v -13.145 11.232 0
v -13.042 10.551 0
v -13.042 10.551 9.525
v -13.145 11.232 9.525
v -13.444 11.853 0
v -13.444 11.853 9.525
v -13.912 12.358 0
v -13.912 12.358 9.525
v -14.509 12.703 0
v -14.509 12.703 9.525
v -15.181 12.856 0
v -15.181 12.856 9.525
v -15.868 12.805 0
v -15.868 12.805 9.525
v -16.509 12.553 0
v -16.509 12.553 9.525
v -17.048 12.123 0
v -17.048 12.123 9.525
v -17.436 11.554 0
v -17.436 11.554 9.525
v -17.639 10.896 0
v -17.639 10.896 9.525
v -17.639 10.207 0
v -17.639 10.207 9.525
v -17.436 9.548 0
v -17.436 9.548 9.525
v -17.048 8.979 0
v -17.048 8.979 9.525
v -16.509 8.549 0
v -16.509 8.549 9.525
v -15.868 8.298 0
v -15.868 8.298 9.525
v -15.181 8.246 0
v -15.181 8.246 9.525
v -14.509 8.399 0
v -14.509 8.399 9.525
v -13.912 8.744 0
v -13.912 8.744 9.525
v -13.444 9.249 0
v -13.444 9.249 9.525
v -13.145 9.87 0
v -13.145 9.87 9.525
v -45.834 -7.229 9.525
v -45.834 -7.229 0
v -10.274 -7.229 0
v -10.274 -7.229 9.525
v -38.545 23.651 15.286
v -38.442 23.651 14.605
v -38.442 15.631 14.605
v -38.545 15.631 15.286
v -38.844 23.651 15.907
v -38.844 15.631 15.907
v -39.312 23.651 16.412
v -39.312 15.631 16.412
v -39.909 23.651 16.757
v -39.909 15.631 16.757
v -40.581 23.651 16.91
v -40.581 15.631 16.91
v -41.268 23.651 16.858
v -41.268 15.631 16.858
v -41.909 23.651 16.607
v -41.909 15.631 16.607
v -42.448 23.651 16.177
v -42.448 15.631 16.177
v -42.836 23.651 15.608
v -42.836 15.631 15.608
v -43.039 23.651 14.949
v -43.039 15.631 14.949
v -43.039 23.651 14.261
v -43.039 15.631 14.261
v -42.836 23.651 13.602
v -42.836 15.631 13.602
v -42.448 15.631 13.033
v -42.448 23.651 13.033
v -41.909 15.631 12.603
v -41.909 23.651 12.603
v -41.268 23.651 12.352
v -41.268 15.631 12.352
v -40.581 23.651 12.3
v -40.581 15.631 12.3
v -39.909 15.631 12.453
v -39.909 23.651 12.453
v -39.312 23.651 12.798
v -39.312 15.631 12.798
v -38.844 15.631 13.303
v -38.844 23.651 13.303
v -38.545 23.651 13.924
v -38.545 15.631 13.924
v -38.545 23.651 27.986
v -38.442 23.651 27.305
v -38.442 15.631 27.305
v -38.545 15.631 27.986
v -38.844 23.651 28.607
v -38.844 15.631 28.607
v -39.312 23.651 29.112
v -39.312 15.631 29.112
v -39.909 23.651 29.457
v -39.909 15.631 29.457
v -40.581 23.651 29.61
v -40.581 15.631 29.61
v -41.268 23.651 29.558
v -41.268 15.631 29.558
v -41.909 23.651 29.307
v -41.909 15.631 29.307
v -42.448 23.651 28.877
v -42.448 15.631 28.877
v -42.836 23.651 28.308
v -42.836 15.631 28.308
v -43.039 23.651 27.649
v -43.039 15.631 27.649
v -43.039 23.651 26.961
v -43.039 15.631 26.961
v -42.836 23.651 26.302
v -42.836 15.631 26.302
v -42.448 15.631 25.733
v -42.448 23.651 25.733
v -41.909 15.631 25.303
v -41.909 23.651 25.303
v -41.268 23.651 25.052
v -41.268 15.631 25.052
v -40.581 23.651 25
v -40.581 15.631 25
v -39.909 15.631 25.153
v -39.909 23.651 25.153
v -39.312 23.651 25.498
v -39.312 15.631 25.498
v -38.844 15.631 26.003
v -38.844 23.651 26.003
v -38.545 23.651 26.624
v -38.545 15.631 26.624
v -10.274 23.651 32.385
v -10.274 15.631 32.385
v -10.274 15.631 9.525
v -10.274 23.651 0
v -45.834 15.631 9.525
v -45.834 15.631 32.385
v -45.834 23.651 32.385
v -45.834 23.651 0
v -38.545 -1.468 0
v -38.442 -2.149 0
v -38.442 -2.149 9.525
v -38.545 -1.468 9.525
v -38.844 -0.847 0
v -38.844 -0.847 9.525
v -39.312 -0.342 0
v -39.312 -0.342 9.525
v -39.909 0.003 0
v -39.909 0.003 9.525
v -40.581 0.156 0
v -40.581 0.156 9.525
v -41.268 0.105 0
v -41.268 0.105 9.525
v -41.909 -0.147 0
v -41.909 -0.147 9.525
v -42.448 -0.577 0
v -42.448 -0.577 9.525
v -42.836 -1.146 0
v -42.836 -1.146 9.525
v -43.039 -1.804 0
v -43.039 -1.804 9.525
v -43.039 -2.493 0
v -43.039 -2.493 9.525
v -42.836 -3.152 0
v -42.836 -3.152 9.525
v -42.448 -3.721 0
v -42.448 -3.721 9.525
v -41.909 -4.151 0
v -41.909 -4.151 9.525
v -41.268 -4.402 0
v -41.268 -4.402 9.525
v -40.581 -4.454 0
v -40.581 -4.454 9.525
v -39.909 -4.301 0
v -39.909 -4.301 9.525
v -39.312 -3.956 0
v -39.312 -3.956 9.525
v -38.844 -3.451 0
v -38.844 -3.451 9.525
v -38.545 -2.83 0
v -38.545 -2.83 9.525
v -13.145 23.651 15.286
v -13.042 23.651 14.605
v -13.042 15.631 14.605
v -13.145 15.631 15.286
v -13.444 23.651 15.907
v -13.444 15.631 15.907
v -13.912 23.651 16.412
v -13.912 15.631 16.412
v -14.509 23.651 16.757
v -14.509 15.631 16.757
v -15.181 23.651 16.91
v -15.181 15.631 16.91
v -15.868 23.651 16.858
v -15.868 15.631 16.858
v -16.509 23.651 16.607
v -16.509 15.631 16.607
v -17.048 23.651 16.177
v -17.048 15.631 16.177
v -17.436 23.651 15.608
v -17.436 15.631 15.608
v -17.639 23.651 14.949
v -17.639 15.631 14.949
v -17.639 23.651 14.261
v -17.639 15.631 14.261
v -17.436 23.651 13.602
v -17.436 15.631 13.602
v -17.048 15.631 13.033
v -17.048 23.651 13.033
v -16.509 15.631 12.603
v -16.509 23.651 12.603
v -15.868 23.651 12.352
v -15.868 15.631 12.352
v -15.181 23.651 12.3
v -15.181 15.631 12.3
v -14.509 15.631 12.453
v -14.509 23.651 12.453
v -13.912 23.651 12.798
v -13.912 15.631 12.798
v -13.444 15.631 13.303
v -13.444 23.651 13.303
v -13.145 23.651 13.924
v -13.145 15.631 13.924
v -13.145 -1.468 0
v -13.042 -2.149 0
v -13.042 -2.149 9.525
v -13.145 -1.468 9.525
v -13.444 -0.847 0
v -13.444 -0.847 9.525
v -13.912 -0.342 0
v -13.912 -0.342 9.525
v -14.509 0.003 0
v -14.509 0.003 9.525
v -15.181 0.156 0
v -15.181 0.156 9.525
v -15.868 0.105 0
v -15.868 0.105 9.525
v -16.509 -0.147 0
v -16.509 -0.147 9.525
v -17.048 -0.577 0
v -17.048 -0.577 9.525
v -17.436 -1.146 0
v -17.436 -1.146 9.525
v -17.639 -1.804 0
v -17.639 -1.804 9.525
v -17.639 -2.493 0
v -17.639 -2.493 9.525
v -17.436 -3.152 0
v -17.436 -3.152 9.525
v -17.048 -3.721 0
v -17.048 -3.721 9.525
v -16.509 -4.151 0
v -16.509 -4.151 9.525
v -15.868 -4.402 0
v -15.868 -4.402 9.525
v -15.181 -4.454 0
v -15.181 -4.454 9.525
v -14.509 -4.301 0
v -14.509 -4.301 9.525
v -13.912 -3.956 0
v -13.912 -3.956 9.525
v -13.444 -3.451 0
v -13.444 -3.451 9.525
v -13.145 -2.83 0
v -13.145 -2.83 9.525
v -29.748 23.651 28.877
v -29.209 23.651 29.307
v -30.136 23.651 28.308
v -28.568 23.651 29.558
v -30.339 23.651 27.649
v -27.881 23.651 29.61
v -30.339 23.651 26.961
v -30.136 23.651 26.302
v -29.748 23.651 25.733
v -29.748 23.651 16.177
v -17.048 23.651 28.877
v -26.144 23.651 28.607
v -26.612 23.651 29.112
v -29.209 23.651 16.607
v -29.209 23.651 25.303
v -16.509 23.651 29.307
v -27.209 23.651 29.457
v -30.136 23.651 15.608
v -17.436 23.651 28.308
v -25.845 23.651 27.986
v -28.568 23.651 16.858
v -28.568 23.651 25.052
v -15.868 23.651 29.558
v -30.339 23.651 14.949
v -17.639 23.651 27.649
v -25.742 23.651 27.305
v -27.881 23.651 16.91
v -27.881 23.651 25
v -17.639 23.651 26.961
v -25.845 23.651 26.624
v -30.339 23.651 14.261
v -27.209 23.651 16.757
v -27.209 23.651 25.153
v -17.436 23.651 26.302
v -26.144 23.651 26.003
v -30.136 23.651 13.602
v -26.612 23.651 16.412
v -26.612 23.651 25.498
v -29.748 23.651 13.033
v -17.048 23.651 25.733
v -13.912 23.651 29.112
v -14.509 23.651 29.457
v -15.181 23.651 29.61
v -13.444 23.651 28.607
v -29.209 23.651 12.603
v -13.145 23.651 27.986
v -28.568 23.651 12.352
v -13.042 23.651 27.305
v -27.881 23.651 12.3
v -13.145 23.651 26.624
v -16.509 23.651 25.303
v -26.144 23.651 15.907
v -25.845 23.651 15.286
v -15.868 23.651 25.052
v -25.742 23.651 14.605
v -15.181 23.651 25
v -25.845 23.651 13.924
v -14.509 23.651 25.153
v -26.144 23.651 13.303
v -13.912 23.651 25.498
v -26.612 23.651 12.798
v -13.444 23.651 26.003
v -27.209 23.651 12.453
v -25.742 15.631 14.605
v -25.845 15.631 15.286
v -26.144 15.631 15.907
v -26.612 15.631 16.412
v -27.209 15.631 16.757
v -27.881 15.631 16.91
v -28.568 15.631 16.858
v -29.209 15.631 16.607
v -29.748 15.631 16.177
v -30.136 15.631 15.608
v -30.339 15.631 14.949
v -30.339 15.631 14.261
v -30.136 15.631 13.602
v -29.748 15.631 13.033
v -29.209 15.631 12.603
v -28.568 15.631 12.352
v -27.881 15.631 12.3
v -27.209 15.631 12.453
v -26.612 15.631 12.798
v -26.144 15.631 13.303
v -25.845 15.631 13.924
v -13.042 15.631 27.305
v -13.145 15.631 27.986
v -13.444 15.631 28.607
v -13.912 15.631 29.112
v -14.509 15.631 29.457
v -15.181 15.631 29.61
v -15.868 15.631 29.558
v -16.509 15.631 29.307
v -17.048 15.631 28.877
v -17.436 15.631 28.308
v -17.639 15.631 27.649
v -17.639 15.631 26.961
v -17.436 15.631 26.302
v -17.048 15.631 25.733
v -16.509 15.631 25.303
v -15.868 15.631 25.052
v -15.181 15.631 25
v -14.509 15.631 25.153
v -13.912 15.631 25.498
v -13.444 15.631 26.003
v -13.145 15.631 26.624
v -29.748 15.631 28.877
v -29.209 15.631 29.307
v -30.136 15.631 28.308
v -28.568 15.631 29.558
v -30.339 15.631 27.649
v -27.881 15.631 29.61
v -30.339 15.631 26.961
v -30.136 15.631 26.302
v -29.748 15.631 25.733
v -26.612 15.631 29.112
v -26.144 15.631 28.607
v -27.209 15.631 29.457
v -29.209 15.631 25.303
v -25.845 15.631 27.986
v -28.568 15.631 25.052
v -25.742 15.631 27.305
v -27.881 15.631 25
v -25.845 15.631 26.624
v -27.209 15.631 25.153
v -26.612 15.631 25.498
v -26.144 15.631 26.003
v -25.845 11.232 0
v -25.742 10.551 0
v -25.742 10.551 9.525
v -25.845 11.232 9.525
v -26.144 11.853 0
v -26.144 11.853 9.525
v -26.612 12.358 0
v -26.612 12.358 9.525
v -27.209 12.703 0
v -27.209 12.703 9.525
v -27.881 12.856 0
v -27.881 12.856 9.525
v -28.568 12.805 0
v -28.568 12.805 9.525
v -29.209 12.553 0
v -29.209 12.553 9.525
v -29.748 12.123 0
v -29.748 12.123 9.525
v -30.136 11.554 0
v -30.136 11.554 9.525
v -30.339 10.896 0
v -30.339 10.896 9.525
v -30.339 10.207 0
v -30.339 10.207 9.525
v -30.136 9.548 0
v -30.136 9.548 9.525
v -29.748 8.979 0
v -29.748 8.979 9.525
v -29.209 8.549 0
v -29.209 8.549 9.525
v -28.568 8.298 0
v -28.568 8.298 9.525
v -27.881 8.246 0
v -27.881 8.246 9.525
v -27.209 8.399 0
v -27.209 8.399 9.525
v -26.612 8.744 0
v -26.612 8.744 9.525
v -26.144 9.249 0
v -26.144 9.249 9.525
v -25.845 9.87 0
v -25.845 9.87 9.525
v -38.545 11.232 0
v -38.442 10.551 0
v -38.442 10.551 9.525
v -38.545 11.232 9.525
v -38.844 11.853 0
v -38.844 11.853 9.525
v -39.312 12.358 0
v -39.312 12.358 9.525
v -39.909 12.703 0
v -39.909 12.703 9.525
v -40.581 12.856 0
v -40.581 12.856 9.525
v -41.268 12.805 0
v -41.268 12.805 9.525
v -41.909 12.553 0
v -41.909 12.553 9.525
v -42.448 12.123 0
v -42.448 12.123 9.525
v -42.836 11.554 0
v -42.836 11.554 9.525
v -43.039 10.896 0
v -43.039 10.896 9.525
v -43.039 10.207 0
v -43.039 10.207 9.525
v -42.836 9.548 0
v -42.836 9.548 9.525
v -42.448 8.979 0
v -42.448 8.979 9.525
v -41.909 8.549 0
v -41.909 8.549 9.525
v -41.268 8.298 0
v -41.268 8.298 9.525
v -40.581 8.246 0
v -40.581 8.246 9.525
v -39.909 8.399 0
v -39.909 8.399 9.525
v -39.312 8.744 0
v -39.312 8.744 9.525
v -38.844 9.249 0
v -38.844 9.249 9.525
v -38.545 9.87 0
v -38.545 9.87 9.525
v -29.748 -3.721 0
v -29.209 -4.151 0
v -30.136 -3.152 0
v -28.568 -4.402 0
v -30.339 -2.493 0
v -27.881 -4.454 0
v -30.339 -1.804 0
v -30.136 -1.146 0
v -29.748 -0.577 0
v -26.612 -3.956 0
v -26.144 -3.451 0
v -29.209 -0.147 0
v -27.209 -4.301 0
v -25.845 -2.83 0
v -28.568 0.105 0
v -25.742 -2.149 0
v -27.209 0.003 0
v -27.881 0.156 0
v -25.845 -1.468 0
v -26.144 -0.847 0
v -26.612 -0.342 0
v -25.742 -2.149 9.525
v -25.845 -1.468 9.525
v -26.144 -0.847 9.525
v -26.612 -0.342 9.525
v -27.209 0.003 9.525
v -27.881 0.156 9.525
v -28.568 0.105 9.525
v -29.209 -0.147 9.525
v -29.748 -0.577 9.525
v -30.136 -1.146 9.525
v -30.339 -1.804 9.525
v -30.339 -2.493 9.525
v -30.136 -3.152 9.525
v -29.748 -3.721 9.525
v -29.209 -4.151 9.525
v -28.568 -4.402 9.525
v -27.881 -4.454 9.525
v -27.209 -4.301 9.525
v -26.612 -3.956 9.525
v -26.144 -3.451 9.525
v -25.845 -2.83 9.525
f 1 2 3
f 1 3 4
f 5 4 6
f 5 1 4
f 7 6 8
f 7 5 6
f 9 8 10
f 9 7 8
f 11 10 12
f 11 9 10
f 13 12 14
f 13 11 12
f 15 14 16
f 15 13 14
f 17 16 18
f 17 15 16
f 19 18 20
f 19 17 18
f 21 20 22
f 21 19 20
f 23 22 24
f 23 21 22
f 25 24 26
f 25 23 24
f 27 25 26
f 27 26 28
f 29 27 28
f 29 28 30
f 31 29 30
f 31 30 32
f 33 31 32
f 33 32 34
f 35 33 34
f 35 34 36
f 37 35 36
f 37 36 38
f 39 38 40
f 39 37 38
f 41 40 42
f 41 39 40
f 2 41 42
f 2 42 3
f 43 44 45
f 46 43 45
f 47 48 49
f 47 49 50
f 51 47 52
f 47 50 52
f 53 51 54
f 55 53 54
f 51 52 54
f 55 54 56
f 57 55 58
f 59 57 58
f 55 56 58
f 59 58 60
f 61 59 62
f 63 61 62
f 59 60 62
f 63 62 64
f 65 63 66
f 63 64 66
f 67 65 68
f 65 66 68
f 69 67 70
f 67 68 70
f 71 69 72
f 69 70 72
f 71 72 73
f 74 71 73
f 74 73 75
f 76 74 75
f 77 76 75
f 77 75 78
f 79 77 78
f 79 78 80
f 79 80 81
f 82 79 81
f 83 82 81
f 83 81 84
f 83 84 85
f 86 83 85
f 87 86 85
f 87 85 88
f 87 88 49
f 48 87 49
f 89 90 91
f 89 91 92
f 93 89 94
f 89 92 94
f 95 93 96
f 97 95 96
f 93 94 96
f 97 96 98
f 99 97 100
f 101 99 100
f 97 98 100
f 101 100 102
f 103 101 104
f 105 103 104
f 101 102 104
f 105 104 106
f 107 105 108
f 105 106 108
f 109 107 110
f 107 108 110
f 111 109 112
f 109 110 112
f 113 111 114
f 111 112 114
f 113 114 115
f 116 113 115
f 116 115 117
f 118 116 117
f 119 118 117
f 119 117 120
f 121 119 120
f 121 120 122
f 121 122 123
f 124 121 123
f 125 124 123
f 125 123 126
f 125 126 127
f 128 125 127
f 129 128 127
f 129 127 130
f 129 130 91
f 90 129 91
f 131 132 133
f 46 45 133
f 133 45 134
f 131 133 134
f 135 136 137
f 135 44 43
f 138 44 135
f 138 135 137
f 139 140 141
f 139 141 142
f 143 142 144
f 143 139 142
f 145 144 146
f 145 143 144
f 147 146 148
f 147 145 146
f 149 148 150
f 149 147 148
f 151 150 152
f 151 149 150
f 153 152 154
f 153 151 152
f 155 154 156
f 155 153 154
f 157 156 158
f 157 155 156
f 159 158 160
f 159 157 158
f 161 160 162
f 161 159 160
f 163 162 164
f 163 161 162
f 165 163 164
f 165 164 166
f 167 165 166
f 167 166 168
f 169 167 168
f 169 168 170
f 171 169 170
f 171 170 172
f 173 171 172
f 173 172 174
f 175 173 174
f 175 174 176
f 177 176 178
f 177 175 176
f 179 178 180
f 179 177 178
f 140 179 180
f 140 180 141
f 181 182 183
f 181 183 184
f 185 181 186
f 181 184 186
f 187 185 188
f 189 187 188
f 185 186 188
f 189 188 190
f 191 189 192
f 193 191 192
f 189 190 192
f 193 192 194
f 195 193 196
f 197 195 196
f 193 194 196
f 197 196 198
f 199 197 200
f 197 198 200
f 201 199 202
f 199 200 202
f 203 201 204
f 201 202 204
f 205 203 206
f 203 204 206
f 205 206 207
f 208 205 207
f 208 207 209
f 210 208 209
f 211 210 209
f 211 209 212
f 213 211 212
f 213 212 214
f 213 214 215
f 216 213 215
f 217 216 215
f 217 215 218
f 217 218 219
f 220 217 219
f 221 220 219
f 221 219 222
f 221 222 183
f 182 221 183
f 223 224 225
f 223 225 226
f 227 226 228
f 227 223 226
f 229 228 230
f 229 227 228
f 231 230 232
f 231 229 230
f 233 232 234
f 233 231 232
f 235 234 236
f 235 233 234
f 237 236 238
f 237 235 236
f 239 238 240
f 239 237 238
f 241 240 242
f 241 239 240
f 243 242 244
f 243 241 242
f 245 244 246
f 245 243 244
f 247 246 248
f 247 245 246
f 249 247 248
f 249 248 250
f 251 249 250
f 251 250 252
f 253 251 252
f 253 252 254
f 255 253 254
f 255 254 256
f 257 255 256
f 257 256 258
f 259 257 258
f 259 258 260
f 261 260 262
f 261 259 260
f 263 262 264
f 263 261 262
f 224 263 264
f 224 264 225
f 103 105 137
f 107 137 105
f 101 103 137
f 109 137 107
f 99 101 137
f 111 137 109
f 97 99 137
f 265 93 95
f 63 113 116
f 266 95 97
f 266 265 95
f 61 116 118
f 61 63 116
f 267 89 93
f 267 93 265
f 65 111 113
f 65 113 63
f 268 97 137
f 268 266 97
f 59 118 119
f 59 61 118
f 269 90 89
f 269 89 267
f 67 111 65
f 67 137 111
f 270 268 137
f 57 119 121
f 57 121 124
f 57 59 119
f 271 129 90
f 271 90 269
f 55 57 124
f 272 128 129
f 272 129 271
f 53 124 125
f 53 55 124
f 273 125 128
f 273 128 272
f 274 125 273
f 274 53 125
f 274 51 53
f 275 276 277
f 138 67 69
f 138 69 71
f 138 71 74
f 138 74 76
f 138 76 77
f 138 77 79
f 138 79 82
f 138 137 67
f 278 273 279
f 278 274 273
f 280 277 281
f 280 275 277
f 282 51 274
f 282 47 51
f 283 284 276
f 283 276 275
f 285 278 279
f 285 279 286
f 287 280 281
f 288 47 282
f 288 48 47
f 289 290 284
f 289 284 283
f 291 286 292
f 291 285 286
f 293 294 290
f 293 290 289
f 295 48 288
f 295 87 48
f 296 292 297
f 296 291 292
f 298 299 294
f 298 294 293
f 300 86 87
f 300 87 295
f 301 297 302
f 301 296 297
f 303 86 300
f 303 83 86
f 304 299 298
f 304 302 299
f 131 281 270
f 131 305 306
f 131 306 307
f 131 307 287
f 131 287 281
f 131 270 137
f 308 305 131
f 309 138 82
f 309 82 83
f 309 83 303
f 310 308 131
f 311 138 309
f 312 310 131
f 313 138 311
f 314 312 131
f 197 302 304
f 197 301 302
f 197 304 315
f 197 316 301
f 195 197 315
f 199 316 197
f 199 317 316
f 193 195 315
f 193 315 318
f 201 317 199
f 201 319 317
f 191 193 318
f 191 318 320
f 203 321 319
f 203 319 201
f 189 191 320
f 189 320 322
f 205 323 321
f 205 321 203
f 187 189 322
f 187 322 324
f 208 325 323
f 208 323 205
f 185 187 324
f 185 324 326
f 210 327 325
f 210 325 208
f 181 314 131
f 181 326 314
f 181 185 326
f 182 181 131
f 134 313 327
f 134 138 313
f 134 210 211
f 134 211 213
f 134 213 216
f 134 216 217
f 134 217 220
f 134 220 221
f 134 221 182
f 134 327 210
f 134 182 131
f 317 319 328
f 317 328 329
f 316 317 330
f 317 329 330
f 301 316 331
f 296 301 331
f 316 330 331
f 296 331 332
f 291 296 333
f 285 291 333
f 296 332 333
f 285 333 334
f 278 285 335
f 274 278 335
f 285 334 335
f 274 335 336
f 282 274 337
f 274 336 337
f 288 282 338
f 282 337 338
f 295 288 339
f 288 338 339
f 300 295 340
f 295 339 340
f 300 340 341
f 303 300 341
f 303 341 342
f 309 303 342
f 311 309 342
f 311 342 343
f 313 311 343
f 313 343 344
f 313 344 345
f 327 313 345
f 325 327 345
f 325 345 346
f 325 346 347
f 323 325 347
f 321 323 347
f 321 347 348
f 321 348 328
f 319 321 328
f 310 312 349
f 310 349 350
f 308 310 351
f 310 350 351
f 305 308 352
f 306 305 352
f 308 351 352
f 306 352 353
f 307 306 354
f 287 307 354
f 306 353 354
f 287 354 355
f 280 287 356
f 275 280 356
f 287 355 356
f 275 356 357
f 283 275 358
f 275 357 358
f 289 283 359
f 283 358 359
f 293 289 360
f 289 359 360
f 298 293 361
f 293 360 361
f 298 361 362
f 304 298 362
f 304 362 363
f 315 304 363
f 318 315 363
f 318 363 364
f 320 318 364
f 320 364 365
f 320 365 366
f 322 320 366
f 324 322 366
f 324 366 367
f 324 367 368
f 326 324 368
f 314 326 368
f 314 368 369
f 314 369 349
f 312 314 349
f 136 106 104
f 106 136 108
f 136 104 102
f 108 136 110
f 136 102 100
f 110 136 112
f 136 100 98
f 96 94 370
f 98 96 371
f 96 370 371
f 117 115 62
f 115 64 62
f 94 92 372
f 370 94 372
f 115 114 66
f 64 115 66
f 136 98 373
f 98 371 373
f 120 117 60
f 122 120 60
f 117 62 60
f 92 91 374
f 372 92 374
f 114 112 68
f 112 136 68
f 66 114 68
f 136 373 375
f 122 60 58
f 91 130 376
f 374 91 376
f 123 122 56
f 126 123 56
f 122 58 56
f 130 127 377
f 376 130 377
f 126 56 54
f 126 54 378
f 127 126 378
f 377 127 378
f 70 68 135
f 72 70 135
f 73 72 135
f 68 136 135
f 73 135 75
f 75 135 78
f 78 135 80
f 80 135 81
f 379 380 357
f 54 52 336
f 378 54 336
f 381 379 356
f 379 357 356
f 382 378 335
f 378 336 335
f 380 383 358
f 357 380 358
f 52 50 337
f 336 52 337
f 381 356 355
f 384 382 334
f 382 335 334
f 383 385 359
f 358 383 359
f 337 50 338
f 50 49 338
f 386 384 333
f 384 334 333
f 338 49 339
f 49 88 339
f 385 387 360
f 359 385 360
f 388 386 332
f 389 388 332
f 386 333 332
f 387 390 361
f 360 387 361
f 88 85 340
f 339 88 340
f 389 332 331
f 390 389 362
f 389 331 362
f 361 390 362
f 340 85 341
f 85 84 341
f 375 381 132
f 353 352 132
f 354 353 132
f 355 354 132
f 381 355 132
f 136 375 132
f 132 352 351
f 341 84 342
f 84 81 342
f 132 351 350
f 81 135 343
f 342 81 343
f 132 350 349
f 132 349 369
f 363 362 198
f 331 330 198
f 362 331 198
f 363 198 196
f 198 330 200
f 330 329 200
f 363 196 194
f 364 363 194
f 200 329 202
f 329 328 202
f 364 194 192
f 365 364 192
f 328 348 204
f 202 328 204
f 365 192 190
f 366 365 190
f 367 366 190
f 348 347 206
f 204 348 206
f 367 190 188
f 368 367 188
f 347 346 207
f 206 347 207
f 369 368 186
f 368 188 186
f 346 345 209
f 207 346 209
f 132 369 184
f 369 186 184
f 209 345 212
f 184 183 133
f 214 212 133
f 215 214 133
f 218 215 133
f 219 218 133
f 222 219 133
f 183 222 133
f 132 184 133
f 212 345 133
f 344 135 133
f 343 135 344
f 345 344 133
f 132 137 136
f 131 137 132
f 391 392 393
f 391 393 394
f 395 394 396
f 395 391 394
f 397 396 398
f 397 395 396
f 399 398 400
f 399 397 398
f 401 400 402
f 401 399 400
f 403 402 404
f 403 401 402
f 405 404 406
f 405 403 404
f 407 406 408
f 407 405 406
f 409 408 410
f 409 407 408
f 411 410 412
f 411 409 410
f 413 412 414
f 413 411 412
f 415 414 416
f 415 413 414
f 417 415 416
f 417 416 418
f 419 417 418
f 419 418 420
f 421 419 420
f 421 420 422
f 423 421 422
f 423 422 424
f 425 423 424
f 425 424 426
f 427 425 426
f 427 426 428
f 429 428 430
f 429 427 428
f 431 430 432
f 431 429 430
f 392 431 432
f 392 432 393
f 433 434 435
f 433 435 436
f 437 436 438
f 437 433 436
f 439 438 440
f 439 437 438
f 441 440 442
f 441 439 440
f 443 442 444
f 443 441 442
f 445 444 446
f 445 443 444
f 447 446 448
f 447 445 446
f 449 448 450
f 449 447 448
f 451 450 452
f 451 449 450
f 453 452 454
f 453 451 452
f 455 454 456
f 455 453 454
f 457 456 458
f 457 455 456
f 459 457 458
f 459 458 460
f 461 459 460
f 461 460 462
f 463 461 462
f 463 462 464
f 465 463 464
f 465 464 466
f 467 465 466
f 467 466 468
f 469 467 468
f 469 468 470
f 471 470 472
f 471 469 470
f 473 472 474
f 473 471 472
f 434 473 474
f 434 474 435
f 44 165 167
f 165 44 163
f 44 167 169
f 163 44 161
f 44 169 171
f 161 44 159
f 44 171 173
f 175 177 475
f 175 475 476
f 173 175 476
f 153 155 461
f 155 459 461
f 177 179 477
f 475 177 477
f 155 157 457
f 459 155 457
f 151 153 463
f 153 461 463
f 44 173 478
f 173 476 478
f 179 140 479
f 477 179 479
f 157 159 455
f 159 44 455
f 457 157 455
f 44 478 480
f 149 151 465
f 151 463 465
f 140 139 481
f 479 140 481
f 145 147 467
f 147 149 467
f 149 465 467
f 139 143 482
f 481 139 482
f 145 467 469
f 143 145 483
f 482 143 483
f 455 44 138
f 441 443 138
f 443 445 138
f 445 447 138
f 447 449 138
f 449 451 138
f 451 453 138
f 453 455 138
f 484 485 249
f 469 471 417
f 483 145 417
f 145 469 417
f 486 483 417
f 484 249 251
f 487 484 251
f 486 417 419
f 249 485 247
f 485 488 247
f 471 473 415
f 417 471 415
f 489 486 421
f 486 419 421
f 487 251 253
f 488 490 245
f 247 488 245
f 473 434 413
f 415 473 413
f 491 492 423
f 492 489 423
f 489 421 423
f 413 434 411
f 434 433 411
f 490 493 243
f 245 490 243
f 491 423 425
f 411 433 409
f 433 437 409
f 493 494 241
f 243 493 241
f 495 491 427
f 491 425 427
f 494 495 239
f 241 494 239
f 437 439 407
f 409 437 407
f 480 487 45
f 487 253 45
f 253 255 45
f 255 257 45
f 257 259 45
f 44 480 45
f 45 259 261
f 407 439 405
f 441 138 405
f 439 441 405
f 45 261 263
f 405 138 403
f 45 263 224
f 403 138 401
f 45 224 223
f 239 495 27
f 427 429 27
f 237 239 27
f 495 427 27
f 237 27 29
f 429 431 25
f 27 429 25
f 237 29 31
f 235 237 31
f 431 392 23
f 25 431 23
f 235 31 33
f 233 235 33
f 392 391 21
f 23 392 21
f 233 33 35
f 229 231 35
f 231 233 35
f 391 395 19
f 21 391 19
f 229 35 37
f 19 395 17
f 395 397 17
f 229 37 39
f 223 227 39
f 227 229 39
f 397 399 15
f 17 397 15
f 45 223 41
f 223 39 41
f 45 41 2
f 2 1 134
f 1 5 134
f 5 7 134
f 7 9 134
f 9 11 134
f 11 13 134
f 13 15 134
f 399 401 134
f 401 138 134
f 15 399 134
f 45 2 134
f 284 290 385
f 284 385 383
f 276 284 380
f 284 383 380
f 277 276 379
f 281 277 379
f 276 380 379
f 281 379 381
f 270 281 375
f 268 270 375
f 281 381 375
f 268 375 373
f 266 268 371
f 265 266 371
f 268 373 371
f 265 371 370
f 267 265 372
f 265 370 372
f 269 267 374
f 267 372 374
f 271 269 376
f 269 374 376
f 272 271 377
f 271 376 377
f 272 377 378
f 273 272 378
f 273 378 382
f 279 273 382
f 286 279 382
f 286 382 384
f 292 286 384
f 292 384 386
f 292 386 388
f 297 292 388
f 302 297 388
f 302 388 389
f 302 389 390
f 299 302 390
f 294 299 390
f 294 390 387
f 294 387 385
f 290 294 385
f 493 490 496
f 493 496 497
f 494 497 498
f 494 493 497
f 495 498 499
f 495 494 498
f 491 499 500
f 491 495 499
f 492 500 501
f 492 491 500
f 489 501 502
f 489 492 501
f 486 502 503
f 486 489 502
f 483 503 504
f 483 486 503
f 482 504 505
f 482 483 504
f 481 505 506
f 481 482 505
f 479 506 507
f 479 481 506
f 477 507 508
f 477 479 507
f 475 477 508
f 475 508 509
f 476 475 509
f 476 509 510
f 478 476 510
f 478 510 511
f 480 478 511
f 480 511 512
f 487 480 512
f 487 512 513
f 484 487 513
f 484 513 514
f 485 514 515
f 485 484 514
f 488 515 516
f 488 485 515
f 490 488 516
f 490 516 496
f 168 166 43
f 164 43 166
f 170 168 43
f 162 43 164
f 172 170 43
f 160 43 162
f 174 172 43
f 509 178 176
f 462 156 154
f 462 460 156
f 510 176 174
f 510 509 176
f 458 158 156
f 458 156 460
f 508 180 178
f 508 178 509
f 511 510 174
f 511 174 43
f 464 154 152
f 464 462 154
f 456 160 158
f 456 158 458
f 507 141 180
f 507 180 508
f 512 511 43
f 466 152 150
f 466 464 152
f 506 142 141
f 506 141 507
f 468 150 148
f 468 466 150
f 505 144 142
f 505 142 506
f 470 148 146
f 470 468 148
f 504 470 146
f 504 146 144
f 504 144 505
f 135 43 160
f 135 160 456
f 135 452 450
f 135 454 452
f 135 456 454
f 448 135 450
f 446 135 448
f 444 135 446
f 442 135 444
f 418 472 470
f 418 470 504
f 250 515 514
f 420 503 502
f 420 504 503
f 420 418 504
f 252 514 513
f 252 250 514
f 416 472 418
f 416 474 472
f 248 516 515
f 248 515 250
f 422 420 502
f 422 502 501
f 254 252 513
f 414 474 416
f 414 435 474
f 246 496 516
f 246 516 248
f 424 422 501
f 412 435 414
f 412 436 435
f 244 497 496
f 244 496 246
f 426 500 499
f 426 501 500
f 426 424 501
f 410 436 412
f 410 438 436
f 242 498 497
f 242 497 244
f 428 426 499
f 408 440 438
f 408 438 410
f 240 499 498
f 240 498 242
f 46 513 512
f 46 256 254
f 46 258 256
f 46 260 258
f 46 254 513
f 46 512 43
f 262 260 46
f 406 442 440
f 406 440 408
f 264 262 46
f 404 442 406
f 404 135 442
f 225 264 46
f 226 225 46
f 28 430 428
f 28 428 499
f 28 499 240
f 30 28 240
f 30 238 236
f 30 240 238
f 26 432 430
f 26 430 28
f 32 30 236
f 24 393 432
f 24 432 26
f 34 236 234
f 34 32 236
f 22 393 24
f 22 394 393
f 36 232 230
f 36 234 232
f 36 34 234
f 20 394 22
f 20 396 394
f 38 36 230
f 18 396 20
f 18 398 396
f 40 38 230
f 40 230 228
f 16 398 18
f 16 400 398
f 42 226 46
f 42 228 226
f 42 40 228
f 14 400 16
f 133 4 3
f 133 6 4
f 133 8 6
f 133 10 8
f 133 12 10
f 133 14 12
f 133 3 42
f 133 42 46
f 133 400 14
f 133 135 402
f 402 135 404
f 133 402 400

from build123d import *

# Parameters (mm, degrees)
F0_R     = 2.3114
F1_DEPTH = 9.525
F0_W     = 35.56
F0_H     = 8.0197834706
F2_DEPTH = 32.385
F3_R     = 2.3114
F4_DEPTH = 25.4


with BuildPart() as f1:
    # F0 (on Top) → F1 (new body)
    with BuildSketch(Plane.XY):
        Polygon((-10.273542943, 15.6310927123), (-45.833542943, 15.6310927123), (-45.833542943, 13.4908761829), (-45.833542943, -7.2289072877), (-10.273542943, -7.2289072877), align=None)
        with Locations((-40.753542943, -2.1489072877)):
            Circle(F0_R, mode=Mode.SUBTRACT)
        with Locations((-28.053542943, -2.1489072877)):
            Circle(F0_R, mode=Mode.SUBTRACT)
        with Locations((-15.353542943, -2.1489072877)):
            Circle(F0_R, mode=Mode.SUBTRACT)
        with Locations((-40.753542943, 10.5510927123)):
            Circle(F0_R, mode=Mode.SUBTRACT)
        with Locations((-28.053542943, 10.5510927123)):
            Circle(F0_R, mode=Mode.SUBTRACT)
        with Locations((-15.353542943, 10.5510927123)):
            Circle(F0_R, mode=Mode.SUBTRACT)
    extrude(amount=F1_DEPTH)

    # F0 (on Top) → F2 (join)
    with BuildSketch(Plane.XY):
        with Locations((-28.053542943, 19.6409844476)):
            Rectangle(F0_W, F0_H)
    extrude(amount=F2_DEPTH)

    # F3 (on face) → F4 (cut)
    with BuildSketch(Plane.XZ.offset(-15.6310927123)):
        with Locations((-40.753542943, 27.305)):
            Circle(F3_R)
        with Locations((-28.053542943, 27.305)):
            Circle(F3_R)
        with Locations((-15.353542943, 27.305)):
            Circle(F3_R)
        with Locations((-15.353542943, 14.605)):
            Circle(F3_R)
        with Locations((-28.053542943, 14.605)):
            Circle(F3_R)
        with Locations((-40.753542943, 14.605)):
            Circle(F3_R)
    extrude(amount=-F4_DEPTH, mode=Mode.SUBTRACT)


solid = f1.part
